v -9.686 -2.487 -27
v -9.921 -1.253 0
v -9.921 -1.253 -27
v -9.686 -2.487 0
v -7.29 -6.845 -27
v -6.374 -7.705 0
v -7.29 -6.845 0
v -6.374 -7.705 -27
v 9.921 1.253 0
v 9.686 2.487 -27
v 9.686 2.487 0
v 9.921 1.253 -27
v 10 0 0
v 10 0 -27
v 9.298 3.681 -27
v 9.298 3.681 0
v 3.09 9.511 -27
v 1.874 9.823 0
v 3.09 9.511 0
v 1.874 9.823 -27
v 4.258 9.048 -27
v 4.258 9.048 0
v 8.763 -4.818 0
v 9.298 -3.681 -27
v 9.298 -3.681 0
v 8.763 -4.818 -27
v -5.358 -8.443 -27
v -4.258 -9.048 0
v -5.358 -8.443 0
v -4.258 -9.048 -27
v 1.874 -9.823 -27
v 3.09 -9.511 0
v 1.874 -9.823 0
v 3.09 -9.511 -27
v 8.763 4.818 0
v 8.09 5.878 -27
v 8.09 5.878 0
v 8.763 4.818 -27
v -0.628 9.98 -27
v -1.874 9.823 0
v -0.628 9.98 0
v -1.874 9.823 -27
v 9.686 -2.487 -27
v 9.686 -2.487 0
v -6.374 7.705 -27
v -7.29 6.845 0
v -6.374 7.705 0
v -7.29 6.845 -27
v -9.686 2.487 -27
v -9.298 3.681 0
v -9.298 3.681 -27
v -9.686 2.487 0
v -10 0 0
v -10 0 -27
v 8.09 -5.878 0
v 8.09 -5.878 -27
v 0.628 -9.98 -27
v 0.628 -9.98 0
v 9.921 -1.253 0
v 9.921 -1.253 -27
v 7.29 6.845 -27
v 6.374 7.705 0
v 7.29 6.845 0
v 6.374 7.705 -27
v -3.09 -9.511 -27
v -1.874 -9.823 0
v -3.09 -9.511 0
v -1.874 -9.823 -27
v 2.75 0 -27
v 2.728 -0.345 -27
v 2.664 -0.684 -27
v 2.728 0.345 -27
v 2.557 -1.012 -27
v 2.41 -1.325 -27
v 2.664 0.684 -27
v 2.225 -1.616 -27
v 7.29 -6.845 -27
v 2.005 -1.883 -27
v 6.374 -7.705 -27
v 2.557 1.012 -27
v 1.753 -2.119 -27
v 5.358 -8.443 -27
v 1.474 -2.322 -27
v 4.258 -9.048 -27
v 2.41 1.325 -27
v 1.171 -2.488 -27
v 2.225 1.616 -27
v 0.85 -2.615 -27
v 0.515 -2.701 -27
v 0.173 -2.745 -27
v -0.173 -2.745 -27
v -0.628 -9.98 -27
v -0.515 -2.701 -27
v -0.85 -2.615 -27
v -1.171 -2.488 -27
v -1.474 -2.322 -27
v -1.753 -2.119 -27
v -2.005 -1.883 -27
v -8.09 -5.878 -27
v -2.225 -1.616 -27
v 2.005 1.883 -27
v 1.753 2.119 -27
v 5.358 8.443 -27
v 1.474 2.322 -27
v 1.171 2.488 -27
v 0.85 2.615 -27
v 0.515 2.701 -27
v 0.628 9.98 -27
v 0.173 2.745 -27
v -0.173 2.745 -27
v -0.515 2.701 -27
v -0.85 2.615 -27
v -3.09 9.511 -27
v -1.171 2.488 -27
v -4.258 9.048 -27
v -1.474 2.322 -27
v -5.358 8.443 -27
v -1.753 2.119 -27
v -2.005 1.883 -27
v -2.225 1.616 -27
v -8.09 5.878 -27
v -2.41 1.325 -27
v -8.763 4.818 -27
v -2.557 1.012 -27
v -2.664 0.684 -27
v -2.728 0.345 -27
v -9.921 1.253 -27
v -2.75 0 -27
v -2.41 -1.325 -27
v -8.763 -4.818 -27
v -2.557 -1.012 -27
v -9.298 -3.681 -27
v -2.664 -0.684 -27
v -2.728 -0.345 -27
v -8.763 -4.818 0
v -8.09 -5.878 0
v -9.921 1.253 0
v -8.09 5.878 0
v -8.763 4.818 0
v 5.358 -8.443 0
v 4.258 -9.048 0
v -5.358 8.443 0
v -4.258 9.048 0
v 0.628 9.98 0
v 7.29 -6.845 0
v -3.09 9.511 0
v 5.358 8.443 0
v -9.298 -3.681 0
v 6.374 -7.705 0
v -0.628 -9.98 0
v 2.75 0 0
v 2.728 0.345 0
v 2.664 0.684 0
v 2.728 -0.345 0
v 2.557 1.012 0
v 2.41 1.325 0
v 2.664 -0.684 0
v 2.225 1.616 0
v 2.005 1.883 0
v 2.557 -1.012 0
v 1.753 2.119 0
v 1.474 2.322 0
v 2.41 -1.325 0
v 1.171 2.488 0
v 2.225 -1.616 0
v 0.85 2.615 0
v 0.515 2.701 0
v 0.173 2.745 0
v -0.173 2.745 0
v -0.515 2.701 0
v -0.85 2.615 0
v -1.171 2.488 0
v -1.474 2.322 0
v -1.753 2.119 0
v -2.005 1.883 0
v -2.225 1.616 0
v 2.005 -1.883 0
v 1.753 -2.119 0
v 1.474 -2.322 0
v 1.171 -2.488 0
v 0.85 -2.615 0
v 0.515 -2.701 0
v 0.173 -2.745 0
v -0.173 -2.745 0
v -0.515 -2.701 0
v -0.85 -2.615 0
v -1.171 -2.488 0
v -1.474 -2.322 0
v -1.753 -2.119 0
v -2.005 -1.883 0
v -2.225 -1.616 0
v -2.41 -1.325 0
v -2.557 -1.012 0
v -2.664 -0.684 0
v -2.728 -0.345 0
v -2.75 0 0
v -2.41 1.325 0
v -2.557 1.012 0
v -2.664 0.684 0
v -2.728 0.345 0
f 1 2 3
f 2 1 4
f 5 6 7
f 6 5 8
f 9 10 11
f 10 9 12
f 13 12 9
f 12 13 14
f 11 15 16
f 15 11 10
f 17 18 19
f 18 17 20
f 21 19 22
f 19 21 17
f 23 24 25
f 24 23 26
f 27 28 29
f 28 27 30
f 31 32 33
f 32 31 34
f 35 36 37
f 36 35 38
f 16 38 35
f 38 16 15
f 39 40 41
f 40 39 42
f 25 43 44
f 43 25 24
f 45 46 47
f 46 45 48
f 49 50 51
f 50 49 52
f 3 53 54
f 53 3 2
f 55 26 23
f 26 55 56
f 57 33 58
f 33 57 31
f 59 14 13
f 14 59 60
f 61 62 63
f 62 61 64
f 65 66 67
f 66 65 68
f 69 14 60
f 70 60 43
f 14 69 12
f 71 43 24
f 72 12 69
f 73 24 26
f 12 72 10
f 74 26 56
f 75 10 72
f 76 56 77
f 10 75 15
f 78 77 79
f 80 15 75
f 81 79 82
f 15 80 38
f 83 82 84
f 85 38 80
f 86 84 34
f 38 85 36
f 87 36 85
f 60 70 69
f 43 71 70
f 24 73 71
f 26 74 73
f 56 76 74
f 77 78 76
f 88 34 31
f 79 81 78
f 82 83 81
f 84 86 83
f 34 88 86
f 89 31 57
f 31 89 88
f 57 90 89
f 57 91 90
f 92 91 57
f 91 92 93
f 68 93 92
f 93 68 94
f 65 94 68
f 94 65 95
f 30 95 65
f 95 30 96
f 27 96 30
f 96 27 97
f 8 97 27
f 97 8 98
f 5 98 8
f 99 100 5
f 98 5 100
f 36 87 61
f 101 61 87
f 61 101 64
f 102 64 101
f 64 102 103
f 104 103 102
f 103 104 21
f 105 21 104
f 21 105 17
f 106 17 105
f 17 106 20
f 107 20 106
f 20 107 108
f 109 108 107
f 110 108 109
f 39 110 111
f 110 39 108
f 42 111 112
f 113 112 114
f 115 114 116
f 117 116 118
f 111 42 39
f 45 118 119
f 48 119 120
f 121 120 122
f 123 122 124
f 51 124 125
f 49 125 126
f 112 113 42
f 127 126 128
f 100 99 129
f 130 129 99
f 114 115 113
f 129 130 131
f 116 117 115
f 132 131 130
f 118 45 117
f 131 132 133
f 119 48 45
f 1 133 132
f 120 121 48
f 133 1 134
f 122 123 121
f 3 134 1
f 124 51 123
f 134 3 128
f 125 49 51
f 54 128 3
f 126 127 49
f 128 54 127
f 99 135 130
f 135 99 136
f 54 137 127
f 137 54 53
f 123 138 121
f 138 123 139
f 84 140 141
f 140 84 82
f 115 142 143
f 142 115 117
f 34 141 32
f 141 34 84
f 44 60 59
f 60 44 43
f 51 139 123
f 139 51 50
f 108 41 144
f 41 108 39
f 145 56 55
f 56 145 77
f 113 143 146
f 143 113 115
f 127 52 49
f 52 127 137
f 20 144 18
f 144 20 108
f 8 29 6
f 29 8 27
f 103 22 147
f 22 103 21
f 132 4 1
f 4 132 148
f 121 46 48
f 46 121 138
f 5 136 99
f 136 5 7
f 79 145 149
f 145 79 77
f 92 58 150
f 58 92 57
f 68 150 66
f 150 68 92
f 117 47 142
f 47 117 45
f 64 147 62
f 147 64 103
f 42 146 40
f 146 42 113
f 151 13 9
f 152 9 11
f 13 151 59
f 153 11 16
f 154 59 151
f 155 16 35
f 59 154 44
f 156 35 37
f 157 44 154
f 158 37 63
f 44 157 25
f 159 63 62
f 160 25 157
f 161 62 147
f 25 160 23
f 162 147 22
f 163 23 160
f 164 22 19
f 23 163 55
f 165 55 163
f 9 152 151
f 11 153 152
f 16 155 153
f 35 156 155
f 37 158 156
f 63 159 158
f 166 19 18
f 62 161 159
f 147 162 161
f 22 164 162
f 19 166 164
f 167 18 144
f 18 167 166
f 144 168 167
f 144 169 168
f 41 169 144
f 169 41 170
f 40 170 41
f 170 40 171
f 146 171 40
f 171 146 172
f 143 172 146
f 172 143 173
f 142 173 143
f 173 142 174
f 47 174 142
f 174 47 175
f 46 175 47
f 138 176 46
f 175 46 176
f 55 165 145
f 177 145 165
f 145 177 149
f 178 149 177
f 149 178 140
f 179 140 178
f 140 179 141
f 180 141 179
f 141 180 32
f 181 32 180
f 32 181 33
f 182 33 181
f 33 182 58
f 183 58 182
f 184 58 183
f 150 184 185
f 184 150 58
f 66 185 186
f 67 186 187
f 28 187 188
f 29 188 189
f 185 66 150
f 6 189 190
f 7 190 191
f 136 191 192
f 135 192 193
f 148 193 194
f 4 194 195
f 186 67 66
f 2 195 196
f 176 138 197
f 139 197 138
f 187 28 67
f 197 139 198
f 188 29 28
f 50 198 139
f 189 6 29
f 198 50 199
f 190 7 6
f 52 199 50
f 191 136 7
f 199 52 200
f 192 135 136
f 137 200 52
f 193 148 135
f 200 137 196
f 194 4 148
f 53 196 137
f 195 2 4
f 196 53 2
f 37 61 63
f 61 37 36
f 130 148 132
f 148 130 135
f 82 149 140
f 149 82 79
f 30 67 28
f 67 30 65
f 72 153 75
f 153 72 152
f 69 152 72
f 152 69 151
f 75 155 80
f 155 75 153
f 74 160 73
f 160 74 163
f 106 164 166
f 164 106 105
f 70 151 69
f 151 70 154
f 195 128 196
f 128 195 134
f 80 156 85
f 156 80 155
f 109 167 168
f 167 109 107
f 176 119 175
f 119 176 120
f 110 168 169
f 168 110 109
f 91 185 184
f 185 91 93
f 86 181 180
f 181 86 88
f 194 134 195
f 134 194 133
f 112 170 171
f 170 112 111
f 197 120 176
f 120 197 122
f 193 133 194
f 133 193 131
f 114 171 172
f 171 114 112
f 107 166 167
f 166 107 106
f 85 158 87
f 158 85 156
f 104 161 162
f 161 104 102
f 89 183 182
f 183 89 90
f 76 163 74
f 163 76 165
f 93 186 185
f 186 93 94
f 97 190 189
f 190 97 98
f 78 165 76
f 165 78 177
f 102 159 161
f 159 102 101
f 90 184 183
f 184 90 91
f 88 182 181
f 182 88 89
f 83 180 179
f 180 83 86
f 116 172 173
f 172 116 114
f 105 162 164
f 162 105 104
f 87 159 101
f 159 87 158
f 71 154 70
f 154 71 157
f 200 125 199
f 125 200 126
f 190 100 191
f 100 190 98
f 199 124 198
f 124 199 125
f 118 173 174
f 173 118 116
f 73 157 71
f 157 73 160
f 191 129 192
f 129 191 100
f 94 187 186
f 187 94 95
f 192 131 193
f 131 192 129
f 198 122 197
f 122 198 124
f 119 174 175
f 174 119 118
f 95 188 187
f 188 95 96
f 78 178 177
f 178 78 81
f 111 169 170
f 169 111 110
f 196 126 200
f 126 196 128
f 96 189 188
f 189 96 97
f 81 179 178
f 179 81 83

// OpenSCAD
$fn = 50;


difference() {
	union() {
		translate(v = [0, 0, -27.0000000000]) {
			cylinder(h = 27, r = 10.0000000000);
		}
	}
	union() {
		#translate(v = [0, 0, -27]) {
			cylinder(h = 27, r = 2.7500000000);
		}
	}
}
